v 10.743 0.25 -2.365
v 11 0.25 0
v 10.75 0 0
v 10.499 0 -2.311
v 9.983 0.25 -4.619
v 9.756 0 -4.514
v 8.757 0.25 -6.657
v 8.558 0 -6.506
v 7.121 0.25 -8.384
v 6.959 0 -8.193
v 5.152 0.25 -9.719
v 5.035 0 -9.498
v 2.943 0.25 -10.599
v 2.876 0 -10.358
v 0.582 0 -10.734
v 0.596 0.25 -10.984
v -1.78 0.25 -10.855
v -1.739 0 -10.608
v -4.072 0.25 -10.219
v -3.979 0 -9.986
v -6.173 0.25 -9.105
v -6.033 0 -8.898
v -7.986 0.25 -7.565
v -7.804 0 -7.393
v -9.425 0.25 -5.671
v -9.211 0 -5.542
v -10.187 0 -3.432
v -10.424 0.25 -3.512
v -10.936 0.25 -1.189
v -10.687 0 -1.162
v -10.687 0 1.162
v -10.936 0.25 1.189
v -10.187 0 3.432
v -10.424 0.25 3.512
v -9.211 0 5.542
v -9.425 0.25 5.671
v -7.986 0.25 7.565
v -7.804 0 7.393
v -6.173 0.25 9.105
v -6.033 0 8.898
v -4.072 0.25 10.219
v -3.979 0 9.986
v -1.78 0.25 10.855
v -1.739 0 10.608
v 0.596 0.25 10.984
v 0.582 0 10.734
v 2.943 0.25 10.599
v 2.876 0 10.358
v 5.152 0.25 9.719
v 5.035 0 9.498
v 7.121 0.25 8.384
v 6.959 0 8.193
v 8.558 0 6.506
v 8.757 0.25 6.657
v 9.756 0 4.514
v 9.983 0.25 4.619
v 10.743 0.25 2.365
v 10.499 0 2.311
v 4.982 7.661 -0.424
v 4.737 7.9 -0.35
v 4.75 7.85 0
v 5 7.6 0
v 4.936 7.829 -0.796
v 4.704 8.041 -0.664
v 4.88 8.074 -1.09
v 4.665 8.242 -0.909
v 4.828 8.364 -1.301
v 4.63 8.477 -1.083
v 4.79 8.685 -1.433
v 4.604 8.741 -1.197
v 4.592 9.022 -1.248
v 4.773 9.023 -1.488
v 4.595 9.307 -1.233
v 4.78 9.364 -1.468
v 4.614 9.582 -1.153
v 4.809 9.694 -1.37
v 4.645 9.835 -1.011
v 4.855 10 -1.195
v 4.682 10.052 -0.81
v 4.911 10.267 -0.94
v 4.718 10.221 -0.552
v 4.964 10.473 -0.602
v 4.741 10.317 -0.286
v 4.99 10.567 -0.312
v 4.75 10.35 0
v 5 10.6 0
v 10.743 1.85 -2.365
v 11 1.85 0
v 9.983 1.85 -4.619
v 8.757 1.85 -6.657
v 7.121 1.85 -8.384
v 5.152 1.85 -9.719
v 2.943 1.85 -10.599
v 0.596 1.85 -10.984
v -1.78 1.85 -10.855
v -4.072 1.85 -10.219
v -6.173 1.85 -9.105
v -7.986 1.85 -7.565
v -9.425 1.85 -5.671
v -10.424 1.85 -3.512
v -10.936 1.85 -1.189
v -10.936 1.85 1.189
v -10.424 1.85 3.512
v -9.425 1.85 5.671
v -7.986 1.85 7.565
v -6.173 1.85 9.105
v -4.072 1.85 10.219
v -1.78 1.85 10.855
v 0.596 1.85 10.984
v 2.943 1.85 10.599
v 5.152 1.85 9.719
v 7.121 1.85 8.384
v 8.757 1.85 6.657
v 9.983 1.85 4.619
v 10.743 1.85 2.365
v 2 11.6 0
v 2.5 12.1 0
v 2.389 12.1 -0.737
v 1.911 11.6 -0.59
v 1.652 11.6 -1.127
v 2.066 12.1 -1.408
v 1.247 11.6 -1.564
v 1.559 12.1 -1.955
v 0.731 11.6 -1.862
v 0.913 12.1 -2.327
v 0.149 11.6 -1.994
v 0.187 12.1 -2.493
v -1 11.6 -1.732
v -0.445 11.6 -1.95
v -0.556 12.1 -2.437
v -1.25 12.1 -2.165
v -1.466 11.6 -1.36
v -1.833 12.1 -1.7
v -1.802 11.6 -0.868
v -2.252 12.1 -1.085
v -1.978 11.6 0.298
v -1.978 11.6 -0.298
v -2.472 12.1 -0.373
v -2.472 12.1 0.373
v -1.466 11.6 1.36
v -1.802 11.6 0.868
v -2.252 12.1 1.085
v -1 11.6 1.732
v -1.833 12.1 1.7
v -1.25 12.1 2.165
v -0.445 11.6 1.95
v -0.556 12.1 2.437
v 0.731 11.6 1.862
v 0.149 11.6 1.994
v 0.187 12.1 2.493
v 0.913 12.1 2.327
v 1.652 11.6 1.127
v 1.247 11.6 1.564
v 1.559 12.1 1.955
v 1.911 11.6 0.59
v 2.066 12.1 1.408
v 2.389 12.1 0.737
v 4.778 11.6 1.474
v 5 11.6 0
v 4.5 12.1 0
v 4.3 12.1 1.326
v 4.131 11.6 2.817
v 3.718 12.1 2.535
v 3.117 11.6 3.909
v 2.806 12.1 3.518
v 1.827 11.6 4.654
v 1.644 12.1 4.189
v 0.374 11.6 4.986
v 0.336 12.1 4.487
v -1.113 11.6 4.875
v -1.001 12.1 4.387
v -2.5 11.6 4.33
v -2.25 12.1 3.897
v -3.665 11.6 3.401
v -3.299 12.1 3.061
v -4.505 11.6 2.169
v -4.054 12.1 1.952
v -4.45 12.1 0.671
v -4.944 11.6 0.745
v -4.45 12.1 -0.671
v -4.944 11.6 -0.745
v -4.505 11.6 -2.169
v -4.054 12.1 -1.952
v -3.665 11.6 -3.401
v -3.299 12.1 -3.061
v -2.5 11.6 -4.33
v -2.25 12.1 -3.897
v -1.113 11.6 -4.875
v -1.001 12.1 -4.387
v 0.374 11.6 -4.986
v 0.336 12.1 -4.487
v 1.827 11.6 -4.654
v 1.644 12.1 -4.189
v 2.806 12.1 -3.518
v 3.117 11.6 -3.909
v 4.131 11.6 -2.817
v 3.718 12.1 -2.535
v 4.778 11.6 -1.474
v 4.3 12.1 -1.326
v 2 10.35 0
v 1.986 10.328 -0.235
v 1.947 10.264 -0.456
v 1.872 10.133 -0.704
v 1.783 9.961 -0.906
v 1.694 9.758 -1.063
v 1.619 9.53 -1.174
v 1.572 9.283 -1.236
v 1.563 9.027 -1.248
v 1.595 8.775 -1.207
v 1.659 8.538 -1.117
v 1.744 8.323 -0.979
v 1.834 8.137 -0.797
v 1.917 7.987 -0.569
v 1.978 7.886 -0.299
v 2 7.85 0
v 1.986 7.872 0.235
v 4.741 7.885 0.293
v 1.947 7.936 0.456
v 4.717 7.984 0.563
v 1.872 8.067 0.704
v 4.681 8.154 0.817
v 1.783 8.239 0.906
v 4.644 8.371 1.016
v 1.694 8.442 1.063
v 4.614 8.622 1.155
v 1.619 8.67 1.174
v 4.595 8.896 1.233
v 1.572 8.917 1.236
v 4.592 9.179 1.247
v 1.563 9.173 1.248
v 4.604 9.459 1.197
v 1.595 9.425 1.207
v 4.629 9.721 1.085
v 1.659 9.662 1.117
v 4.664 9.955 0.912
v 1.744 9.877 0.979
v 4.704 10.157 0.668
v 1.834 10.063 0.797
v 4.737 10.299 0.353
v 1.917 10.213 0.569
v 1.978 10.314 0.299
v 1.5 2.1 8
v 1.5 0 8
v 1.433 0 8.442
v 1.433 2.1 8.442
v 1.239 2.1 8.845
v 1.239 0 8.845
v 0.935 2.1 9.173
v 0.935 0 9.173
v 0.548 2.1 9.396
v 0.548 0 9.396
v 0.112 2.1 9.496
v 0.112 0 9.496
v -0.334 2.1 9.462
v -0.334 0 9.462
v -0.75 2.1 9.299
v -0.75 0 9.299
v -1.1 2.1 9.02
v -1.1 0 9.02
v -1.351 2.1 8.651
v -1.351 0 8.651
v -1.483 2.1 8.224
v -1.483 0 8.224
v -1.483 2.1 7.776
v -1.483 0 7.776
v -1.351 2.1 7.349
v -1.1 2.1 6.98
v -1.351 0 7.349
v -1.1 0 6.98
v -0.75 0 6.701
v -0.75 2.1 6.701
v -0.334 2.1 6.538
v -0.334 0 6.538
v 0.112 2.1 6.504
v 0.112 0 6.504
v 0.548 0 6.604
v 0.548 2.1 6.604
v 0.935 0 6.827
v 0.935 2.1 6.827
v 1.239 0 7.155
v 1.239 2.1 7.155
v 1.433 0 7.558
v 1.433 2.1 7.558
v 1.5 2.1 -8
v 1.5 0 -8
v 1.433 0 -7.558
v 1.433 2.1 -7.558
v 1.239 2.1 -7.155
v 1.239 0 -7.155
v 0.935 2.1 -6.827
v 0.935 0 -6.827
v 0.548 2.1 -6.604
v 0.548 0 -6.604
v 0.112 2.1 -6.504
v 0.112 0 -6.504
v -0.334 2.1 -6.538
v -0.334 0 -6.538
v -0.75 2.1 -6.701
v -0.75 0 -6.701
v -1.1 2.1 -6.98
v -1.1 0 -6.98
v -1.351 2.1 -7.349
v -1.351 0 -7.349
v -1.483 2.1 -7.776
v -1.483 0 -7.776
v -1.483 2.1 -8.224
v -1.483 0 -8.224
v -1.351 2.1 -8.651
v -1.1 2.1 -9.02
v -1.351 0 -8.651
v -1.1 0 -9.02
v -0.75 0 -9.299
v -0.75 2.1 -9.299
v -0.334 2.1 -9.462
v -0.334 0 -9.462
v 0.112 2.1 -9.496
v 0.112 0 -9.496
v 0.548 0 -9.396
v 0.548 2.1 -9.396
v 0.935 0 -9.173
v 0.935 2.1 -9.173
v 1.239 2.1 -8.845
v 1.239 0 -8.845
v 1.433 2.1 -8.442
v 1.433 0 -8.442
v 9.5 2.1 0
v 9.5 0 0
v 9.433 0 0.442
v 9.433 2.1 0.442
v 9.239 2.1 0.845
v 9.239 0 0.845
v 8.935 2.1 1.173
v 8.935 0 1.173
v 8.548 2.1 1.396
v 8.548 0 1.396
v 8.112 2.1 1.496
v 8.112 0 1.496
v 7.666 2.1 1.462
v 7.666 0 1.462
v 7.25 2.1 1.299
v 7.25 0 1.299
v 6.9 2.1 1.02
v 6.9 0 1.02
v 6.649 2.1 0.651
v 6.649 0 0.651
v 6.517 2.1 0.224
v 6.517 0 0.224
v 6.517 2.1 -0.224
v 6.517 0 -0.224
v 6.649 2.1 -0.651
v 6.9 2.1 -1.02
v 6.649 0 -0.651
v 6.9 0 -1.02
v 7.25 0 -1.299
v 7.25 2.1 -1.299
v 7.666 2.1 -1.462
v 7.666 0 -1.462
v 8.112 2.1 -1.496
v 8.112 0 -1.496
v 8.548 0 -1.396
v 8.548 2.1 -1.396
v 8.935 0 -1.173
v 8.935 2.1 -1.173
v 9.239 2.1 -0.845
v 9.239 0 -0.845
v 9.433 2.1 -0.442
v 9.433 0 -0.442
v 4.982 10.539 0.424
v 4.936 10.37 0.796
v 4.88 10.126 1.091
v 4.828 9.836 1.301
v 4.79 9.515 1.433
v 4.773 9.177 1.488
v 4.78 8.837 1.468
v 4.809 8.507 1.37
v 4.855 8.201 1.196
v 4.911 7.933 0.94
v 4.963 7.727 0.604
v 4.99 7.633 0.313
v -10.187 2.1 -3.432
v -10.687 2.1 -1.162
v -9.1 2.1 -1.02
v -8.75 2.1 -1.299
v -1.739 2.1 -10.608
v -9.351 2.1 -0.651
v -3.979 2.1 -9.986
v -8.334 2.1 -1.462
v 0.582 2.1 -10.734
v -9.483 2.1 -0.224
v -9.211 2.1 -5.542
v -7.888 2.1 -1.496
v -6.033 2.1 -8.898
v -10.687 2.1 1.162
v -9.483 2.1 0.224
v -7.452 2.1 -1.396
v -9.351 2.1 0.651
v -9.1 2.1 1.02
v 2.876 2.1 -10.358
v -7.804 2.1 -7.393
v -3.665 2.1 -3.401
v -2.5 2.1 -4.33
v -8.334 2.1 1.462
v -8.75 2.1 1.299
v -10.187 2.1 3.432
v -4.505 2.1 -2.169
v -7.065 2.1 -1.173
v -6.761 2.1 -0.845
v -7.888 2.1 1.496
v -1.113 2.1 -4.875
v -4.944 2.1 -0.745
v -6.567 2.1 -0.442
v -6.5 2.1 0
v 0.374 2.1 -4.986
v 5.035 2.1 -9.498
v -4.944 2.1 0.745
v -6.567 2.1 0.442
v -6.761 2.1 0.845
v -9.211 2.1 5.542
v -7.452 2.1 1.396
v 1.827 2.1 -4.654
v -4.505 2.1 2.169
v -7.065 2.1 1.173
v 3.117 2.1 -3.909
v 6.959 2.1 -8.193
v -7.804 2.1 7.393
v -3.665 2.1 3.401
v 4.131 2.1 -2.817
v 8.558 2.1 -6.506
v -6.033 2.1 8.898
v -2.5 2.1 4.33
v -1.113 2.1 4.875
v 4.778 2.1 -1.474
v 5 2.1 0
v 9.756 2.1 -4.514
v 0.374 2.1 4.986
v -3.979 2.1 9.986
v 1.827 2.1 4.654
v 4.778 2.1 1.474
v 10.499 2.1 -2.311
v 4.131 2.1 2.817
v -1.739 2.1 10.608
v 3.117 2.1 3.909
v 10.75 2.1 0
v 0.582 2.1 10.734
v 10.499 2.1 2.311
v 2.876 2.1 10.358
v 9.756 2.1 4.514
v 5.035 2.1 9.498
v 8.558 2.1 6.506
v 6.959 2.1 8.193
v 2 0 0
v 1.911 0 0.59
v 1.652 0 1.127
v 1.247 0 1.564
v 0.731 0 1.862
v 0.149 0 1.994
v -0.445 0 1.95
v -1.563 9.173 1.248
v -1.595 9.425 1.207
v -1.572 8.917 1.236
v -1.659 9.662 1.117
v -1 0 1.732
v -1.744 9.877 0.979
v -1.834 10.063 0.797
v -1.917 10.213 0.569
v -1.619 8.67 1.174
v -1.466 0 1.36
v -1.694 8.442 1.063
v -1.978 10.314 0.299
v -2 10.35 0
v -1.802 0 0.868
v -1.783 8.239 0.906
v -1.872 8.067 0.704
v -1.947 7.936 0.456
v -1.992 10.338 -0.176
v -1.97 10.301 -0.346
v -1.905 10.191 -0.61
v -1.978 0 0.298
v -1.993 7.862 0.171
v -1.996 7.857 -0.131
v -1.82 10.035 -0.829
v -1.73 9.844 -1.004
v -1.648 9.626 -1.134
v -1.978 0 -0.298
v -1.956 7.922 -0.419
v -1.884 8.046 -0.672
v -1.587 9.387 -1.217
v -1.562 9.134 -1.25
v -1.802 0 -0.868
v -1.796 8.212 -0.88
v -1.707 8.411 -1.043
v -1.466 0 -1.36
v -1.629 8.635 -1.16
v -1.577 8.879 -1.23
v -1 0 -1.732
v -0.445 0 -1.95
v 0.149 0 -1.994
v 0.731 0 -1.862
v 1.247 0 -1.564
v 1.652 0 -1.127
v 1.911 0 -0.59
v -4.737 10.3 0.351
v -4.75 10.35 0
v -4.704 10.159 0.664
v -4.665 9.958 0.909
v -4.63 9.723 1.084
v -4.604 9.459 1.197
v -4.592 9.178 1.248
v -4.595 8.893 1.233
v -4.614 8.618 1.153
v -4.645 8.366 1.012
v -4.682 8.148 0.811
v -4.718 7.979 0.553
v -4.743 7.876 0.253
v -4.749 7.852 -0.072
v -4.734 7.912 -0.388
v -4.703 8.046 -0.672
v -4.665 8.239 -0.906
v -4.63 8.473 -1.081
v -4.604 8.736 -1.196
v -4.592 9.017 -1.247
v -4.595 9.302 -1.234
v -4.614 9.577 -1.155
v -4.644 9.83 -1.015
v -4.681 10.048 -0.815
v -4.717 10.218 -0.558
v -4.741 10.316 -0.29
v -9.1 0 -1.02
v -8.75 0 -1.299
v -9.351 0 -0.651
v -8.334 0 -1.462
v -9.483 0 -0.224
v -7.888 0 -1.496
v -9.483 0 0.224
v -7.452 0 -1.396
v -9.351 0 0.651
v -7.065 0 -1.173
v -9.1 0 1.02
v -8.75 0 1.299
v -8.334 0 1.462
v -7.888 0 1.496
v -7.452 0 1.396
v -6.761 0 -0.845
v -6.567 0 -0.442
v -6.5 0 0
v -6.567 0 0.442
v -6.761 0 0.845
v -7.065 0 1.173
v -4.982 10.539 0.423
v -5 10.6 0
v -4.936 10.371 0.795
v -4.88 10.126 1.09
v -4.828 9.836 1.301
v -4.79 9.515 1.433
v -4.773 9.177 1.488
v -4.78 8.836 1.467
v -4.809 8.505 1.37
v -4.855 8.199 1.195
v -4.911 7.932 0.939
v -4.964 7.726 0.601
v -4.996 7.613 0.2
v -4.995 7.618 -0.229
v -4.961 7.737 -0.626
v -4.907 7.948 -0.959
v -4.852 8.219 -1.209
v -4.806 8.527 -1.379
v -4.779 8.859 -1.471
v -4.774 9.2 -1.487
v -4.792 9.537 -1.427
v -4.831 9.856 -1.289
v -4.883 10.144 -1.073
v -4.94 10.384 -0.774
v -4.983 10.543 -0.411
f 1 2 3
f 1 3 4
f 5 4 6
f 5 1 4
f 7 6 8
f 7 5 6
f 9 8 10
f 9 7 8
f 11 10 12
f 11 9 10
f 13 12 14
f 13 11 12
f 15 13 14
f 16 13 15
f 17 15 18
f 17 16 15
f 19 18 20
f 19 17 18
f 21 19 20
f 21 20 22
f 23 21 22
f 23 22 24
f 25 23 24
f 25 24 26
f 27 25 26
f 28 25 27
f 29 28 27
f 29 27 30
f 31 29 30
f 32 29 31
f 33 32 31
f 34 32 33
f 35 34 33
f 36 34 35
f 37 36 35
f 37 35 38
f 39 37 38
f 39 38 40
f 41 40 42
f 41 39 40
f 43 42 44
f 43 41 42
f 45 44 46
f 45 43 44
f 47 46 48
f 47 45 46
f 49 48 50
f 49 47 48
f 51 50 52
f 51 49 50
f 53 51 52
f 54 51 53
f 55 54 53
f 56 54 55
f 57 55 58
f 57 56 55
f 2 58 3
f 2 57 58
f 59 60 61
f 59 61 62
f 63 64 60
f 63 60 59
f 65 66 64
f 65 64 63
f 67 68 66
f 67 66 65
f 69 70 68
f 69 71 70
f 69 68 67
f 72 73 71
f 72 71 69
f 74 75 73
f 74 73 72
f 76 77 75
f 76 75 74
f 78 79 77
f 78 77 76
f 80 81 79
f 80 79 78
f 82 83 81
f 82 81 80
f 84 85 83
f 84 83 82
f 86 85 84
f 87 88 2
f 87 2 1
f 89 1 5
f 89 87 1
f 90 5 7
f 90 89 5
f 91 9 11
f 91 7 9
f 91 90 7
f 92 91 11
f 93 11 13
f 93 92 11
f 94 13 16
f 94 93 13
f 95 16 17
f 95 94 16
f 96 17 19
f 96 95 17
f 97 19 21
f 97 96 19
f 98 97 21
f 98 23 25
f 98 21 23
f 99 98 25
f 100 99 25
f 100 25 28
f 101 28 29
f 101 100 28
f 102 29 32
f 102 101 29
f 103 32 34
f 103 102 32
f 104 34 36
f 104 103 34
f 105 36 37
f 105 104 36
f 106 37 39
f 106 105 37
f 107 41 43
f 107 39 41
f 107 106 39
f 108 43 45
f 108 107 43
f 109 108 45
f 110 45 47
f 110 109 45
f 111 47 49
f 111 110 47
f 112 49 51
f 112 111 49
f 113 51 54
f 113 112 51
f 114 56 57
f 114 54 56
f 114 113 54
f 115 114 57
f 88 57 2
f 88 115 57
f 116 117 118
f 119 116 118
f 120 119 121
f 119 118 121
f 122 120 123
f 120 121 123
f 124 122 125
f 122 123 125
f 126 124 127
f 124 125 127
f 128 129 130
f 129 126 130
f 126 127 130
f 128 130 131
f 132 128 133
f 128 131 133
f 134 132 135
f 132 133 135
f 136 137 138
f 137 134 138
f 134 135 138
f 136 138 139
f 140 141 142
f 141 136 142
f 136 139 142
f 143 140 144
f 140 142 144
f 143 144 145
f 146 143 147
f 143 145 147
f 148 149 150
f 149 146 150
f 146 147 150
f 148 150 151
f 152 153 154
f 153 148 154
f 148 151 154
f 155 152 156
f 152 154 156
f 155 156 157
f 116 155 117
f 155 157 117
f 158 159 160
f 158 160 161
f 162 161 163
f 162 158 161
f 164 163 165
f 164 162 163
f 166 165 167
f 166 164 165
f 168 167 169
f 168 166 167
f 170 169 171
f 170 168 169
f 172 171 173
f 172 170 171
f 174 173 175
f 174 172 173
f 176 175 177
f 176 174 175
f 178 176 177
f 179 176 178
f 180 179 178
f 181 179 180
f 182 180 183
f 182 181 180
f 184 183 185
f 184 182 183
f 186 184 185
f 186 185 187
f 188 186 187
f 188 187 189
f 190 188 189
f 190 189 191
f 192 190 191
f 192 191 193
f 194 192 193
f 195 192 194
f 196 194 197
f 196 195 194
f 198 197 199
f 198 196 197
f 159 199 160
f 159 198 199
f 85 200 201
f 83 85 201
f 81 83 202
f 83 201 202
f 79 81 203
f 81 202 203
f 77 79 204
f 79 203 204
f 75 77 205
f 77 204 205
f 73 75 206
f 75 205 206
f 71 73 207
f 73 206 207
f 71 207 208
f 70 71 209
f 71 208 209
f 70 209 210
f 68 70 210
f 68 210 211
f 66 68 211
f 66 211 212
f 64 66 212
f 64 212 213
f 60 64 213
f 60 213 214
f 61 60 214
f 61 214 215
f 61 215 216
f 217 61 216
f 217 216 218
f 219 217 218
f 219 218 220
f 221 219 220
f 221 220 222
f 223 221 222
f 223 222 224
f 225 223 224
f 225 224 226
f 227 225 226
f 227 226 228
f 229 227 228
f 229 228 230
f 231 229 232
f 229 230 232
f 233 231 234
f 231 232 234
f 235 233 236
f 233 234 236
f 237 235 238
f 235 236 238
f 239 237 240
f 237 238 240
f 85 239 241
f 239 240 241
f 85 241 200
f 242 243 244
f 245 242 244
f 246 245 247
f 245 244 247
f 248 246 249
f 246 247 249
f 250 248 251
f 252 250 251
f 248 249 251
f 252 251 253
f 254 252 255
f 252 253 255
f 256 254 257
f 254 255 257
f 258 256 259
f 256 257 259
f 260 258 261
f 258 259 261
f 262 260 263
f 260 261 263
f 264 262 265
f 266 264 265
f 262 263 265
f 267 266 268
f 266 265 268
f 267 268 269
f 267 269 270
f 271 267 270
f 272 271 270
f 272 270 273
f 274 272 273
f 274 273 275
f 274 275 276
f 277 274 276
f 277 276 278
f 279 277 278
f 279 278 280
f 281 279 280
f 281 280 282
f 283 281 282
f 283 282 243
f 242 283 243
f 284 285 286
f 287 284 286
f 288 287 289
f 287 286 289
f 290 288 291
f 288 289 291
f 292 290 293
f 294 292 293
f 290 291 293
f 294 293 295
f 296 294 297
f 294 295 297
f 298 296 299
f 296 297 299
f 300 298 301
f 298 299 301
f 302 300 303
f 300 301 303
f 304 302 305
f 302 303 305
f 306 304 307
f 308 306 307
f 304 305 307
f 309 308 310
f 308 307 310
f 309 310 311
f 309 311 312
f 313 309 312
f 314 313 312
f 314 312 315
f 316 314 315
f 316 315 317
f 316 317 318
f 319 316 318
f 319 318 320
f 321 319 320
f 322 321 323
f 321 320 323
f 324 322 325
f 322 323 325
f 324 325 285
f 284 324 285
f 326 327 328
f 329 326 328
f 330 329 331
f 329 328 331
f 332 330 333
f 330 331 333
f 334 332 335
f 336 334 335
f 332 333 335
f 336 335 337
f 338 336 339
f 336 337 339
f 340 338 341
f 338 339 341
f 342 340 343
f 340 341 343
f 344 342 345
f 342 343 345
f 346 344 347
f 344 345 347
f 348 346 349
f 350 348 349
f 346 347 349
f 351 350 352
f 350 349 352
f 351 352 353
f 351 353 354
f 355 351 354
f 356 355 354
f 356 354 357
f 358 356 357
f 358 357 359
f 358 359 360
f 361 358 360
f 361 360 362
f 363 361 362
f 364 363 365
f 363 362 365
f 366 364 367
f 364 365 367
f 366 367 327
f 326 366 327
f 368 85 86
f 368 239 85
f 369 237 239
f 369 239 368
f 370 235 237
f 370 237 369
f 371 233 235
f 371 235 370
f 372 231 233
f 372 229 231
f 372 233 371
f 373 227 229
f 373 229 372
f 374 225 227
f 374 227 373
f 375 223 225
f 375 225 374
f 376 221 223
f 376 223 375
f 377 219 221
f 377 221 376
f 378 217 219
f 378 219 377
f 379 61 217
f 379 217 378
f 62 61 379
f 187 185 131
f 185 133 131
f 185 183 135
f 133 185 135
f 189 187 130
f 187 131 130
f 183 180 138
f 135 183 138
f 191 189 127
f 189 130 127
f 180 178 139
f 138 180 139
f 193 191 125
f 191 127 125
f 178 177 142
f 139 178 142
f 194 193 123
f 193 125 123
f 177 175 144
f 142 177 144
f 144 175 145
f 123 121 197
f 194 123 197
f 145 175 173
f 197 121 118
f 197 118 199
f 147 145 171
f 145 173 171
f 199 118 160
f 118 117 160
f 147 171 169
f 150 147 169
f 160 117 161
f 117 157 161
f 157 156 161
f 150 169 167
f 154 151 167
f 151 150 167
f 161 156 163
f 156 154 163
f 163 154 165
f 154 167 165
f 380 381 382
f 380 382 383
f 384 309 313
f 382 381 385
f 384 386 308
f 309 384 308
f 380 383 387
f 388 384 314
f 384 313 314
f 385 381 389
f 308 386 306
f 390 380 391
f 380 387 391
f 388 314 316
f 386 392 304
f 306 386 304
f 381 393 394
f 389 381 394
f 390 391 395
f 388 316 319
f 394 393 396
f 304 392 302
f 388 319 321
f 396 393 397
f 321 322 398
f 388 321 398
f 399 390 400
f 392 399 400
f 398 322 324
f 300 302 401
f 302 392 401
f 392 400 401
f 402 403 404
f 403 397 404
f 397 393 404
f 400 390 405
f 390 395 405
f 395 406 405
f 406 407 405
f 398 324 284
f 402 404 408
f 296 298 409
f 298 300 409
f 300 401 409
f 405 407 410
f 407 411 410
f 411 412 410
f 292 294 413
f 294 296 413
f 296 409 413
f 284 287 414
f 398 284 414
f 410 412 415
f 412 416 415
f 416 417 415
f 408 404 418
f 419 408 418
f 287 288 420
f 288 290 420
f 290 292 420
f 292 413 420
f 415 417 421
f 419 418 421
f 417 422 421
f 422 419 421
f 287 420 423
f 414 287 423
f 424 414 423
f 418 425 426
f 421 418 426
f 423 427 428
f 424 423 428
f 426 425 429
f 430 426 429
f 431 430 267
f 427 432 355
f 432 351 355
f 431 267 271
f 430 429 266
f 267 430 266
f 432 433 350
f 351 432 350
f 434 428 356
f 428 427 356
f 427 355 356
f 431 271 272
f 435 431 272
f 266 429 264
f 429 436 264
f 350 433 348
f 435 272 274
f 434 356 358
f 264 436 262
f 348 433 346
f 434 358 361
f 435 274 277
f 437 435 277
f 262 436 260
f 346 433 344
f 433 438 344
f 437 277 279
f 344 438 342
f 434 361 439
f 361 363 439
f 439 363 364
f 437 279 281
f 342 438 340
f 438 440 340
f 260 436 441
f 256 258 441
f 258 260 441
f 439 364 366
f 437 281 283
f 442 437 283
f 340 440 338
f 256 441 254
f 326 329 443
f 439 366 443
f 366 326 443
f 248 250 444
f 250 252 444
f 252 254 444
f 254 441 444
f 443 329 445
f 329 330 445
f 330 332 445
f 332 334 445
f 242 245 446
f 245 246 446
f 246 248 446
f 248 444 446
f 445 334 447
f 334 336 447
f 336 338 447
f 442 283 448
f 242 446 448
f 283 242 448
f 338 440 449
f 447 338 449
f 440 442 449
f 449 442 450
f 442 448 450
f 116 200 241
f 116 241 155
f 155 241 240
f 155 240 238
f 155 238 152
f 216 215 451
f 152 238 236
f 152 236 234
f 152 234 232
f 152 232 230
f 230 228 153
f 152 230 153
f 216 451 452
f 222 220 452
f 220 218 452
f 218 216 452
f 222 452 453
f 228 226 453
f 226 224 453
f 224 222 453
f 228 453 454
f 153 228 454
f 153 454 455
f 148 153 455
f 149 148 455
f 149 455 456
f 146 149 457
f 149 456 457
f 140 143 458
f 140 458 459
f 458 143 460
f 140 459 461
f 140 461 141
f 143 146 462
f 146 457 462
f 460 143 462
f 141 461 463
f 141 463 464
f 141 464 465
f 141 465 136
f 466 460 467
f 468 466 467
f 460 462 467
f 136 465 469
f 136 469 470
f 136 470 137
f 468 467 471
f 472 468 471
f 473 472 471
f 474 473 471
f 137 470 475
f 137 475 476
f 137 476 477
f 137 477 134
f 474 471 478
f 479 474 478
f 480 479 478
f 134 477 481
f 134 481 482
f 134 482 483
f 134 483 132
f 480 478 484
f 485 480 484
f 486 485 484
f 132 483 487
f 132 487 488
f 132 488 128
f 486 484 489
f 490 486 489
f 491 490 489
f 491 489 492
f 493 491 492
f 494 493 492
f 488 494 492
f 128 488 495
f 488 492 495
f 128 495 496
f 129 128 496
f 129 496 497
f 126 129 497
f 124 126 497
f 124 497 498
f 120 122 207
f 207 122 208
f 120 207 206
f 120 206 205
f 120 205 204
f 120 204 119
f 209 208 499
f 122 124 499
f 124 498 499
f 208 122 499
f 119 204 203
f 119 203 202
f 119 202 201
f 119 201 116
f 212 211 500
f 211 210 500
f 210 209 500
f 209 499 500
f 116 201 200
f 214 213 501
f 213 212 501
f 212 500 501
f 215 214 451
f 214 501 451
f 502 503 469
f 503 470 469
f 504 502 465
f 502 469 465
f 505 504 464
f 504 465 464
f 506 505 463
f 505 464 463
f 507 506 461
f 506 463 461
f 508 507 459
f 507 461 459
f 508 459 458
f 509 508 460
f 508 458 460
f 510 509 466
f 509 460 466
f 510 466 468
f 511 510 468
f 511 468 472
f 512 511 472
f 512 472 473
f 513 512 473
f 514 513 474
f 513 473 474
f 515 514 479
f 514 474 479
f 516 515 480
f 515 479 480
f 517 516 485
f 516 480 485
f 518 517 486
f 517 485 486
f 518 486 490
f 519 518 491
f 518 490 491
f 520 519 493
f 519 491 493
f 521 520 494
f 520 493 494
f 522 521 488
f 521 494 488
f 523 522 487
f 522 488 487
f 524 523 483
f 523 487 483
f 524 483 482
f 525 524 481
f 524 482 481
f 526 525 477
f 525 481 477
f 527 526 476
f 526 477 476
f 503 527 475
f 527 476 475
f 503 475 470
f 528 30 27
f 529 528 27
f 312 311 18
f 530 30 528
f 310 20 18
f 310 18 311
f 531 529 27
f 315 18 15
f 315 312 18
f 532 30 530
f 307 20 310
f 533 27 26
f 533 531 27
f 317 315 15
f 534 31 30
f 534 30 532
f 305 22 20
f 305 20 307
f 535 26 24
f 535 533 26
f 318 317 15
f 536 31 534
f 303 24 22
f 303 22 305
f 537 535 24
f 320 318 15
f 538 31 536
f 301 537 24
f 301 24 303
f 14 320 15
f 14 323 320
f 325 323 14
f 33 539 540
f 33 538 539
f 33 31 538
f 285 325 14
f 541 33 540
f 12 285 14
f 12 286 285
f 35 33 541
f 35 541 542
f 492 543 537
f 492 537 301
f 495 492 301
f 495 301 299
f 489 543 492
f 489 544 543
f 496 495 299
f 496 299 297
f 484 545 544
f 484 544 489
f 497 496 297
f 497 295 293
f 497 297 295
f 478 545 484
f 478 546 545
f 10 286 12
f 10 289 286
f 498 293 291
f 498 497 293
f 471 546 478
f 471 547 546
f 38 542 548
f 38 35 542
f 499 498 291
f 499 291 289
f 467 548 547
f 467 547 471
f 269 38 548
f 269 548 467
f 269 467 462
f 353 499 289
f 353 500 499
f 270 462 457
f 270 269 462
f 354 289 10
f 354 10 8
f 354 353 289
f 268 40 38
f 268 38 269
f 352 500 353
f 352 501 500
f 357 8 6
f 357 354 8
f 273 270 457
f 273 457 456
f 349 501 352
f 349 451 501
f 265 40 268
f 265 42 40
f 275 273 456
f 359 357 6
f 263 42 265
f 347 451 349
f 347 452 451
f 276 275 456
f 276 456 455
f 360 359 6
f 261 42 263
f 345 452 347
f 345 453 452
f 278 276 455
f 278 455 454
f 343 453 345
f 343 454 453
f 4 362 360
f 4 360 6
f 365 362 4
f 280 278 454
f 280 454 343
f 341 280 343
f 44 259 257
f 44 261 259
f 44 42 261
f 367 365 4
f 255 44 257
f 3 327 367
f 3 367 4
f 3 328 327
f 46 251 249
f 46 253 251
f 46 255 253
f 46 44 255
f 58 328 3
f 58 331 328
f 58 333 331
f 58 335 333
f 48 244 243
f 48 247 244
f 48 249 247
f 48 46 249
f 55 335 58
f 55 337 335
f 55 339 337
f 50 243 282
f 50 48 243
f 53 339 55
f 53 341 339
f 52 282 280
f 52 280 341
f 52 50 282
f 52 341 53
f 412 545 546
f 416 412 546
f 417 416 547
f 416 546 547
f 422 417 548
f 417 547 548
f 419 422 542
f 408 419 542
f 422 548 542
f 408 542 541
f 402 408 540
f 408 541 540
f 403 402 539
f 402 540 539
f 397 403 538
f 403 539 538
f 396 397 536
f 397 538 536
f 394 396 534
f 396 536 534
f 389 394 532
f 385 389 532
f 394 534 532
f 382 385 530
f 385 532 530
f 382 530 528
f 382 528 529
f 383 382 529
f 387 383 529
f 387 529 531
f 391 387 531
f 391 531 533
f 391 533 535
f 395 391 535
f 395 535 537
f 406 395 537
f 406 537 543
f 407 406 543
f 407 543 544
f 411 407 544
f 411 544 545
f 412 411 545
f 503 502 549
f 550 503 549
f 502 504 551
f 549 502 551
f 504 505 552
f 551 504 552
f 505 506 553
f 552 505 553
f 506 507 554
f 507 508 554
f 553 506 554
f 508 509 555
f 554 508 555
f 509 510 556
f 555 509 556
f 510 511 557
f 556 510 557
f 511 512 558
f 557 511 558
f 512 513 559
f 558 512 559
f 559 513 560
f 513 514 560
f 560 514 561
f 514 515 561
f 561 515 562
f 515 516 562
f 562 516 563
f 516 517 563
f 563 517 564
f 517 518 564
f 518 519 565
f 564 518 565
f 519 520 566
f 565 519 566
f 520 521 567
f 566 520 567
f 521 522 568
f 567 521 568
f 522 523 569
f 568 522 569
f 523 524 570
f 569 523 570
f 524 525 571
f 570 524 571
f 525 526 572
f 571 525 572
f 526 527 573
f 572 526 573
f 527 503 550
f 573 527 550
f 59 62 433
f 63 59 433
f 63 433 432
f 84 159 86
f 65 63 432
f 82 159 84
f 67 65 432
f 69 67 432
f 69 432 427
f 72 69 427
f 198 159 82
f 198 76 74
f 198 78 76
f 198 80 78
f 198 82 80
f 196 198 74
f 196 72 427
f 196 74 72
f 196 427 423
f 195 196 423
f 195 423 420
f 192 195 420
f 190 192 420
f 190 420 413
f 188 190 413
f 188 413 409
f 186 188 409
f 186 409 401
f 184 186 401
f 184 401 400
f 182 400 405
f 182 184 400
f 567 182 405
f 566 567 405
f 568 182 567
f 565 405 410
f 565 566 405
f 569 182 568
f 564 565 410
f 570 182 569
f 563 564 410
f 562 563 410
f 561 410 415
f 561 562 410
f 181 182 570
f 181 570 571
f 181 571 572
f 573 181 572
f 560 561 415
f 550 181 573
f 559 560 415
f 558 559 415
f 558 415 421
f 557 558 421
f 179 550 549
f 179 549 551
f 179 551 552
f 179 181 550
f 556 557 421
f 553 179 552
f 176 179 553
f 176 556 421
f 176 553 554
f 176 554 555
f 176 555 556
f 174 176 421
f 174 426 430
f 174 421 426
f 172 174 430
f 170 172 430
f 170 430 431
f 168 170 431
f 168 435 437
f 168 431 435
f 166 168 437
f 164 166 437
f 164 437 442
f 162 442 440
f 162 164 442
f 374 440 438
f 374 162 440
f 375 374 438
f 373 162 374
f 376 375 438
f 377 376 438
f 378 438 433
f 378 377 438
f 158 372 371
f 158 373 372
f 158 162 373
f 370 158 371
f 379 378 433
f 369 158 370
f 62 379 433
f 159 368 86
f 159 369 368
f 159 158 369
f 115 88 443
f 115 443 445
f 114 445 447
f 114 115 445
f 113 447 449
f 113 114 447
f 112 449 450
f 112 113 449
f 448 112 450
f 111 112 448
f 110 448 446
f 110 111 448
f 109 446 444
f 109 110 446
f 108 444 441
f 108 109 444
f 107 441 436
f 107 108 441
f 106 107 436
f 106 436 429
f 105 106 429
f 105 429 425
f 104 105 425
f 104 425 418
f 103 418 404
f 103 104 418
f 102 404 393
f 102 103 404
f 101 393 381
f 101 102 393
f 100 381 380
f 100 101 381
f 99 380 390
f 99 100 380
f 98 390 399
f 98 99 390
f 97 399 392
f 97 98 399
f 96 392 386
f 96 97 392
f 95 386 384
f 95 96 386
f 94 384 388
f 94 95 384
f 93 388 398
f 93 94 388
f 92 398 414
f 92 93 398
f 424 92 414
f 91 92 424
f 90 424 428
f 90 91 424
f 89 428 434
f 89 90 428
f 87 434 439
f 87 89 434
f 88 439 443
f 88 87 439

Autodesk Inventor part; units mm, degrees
ref_plane "YZ Plane" through (0, 0, 0) normal (1, 0, 0) x (0, 1, 0)
ref_plane "XZ Plane" through (0, 0, 0) normal (0, 1, 0) x (-1, 0, 0)
ref_plane "XY Plane" through (0, 0, 0) normal (0, 0, 1) x (1, 0, 0)
sketch "Sketch1" plane through (0, 0, 0) normal (0, 0, 1) x (1, 0, 0)
  line L0 (0, 0) -> (11, 0)
  line L1 (11, 0) -> (11, 2.1)
  line L2 (11, 2.1) -> (0, 2.1)
  line L3 (0, 2.1) -> (0, 0)
  line L4 (0, 0) -> (5, 0)
  line L5 (5, 0) -> (5, 12.1)
  line L6 (5, 12.1) -> (0, 12.1)
  line L7 (0, 12.1) -> (0, 0)
  line L8 (0, 12.1) -> (2, 12.1)
  line L9 (2, 12.1) -> (2, 0)
  line L10 (2, 0) -> (0, 0)
  line L11 (0, 0) -> (0, 12.1)
  point P0 (2, 0)
  point P1 (5, 2.1)
  dimension "d0" = 11
  dimension "d1" = 2.1
  dimension "d2" = 5
  dimension "d3" = 12.1
  dimension "d4" = 2
revolve "Revolution1" add sketch "Sketch1" angle 360 about axis through (0, 12.1, 0) along (0, -1, 0) contours L9 L2 L5 L0 | L5 L2 L1 L0 | L9 L6 L5 L2
sketch "Sketch2" plane through (0, 0, 0) normal (0, -1, 0) x (1, 0, 0)
  circle A0 centre (0, 0) radius 8 construction
  line L0 (0, 0) -> (8, 0) construction
  circle A1 centre (8, 0) radius 1.5
  circle A2 centre (0, 8) radius 1.5
  circle A3 centre (-8, 0) radius 1.5
  circle A4 centre (0, -8) radius 1.5
  dimension "d6" = 16
  dimension "d7" = 3
  dimension "d10" = 360
extrude "Extrusion1" cut sketch "Sketch2" against normal through all
sketch "Sketch3" plane through (0, 0, 0) normal (1, 0, 0) x (0, 1, 0)
  line L0 (12.1, 5) -> (12.1, -5) projected
  line L1 (12.1, 0) -> (0, 0) construction
  circle A0 centre (9.1, 0) radius 1.25
  dimension "d14" = 2.5
  dimension "d15" = 3
extrude "Extrusion2" cut sketch "Sketch3" along normal through all both and the other way through all
chamfer "Chamfer1" distance 0.5 angle 45 2 edges at (-5, 12.1, 0) (-2, 12.1, 0)
chamfer "Chamfer2" distance 0.25 angle 45 5 edges at (-11, 0, 0) (-11, 2.1, 0) (4.8412, 9.0999, -1.25) (4.8412, 9.1, 1.25) (-5, 7.85, -0.0003)
properties part number "Hubs - 4mm" material "Stainless Steel"
